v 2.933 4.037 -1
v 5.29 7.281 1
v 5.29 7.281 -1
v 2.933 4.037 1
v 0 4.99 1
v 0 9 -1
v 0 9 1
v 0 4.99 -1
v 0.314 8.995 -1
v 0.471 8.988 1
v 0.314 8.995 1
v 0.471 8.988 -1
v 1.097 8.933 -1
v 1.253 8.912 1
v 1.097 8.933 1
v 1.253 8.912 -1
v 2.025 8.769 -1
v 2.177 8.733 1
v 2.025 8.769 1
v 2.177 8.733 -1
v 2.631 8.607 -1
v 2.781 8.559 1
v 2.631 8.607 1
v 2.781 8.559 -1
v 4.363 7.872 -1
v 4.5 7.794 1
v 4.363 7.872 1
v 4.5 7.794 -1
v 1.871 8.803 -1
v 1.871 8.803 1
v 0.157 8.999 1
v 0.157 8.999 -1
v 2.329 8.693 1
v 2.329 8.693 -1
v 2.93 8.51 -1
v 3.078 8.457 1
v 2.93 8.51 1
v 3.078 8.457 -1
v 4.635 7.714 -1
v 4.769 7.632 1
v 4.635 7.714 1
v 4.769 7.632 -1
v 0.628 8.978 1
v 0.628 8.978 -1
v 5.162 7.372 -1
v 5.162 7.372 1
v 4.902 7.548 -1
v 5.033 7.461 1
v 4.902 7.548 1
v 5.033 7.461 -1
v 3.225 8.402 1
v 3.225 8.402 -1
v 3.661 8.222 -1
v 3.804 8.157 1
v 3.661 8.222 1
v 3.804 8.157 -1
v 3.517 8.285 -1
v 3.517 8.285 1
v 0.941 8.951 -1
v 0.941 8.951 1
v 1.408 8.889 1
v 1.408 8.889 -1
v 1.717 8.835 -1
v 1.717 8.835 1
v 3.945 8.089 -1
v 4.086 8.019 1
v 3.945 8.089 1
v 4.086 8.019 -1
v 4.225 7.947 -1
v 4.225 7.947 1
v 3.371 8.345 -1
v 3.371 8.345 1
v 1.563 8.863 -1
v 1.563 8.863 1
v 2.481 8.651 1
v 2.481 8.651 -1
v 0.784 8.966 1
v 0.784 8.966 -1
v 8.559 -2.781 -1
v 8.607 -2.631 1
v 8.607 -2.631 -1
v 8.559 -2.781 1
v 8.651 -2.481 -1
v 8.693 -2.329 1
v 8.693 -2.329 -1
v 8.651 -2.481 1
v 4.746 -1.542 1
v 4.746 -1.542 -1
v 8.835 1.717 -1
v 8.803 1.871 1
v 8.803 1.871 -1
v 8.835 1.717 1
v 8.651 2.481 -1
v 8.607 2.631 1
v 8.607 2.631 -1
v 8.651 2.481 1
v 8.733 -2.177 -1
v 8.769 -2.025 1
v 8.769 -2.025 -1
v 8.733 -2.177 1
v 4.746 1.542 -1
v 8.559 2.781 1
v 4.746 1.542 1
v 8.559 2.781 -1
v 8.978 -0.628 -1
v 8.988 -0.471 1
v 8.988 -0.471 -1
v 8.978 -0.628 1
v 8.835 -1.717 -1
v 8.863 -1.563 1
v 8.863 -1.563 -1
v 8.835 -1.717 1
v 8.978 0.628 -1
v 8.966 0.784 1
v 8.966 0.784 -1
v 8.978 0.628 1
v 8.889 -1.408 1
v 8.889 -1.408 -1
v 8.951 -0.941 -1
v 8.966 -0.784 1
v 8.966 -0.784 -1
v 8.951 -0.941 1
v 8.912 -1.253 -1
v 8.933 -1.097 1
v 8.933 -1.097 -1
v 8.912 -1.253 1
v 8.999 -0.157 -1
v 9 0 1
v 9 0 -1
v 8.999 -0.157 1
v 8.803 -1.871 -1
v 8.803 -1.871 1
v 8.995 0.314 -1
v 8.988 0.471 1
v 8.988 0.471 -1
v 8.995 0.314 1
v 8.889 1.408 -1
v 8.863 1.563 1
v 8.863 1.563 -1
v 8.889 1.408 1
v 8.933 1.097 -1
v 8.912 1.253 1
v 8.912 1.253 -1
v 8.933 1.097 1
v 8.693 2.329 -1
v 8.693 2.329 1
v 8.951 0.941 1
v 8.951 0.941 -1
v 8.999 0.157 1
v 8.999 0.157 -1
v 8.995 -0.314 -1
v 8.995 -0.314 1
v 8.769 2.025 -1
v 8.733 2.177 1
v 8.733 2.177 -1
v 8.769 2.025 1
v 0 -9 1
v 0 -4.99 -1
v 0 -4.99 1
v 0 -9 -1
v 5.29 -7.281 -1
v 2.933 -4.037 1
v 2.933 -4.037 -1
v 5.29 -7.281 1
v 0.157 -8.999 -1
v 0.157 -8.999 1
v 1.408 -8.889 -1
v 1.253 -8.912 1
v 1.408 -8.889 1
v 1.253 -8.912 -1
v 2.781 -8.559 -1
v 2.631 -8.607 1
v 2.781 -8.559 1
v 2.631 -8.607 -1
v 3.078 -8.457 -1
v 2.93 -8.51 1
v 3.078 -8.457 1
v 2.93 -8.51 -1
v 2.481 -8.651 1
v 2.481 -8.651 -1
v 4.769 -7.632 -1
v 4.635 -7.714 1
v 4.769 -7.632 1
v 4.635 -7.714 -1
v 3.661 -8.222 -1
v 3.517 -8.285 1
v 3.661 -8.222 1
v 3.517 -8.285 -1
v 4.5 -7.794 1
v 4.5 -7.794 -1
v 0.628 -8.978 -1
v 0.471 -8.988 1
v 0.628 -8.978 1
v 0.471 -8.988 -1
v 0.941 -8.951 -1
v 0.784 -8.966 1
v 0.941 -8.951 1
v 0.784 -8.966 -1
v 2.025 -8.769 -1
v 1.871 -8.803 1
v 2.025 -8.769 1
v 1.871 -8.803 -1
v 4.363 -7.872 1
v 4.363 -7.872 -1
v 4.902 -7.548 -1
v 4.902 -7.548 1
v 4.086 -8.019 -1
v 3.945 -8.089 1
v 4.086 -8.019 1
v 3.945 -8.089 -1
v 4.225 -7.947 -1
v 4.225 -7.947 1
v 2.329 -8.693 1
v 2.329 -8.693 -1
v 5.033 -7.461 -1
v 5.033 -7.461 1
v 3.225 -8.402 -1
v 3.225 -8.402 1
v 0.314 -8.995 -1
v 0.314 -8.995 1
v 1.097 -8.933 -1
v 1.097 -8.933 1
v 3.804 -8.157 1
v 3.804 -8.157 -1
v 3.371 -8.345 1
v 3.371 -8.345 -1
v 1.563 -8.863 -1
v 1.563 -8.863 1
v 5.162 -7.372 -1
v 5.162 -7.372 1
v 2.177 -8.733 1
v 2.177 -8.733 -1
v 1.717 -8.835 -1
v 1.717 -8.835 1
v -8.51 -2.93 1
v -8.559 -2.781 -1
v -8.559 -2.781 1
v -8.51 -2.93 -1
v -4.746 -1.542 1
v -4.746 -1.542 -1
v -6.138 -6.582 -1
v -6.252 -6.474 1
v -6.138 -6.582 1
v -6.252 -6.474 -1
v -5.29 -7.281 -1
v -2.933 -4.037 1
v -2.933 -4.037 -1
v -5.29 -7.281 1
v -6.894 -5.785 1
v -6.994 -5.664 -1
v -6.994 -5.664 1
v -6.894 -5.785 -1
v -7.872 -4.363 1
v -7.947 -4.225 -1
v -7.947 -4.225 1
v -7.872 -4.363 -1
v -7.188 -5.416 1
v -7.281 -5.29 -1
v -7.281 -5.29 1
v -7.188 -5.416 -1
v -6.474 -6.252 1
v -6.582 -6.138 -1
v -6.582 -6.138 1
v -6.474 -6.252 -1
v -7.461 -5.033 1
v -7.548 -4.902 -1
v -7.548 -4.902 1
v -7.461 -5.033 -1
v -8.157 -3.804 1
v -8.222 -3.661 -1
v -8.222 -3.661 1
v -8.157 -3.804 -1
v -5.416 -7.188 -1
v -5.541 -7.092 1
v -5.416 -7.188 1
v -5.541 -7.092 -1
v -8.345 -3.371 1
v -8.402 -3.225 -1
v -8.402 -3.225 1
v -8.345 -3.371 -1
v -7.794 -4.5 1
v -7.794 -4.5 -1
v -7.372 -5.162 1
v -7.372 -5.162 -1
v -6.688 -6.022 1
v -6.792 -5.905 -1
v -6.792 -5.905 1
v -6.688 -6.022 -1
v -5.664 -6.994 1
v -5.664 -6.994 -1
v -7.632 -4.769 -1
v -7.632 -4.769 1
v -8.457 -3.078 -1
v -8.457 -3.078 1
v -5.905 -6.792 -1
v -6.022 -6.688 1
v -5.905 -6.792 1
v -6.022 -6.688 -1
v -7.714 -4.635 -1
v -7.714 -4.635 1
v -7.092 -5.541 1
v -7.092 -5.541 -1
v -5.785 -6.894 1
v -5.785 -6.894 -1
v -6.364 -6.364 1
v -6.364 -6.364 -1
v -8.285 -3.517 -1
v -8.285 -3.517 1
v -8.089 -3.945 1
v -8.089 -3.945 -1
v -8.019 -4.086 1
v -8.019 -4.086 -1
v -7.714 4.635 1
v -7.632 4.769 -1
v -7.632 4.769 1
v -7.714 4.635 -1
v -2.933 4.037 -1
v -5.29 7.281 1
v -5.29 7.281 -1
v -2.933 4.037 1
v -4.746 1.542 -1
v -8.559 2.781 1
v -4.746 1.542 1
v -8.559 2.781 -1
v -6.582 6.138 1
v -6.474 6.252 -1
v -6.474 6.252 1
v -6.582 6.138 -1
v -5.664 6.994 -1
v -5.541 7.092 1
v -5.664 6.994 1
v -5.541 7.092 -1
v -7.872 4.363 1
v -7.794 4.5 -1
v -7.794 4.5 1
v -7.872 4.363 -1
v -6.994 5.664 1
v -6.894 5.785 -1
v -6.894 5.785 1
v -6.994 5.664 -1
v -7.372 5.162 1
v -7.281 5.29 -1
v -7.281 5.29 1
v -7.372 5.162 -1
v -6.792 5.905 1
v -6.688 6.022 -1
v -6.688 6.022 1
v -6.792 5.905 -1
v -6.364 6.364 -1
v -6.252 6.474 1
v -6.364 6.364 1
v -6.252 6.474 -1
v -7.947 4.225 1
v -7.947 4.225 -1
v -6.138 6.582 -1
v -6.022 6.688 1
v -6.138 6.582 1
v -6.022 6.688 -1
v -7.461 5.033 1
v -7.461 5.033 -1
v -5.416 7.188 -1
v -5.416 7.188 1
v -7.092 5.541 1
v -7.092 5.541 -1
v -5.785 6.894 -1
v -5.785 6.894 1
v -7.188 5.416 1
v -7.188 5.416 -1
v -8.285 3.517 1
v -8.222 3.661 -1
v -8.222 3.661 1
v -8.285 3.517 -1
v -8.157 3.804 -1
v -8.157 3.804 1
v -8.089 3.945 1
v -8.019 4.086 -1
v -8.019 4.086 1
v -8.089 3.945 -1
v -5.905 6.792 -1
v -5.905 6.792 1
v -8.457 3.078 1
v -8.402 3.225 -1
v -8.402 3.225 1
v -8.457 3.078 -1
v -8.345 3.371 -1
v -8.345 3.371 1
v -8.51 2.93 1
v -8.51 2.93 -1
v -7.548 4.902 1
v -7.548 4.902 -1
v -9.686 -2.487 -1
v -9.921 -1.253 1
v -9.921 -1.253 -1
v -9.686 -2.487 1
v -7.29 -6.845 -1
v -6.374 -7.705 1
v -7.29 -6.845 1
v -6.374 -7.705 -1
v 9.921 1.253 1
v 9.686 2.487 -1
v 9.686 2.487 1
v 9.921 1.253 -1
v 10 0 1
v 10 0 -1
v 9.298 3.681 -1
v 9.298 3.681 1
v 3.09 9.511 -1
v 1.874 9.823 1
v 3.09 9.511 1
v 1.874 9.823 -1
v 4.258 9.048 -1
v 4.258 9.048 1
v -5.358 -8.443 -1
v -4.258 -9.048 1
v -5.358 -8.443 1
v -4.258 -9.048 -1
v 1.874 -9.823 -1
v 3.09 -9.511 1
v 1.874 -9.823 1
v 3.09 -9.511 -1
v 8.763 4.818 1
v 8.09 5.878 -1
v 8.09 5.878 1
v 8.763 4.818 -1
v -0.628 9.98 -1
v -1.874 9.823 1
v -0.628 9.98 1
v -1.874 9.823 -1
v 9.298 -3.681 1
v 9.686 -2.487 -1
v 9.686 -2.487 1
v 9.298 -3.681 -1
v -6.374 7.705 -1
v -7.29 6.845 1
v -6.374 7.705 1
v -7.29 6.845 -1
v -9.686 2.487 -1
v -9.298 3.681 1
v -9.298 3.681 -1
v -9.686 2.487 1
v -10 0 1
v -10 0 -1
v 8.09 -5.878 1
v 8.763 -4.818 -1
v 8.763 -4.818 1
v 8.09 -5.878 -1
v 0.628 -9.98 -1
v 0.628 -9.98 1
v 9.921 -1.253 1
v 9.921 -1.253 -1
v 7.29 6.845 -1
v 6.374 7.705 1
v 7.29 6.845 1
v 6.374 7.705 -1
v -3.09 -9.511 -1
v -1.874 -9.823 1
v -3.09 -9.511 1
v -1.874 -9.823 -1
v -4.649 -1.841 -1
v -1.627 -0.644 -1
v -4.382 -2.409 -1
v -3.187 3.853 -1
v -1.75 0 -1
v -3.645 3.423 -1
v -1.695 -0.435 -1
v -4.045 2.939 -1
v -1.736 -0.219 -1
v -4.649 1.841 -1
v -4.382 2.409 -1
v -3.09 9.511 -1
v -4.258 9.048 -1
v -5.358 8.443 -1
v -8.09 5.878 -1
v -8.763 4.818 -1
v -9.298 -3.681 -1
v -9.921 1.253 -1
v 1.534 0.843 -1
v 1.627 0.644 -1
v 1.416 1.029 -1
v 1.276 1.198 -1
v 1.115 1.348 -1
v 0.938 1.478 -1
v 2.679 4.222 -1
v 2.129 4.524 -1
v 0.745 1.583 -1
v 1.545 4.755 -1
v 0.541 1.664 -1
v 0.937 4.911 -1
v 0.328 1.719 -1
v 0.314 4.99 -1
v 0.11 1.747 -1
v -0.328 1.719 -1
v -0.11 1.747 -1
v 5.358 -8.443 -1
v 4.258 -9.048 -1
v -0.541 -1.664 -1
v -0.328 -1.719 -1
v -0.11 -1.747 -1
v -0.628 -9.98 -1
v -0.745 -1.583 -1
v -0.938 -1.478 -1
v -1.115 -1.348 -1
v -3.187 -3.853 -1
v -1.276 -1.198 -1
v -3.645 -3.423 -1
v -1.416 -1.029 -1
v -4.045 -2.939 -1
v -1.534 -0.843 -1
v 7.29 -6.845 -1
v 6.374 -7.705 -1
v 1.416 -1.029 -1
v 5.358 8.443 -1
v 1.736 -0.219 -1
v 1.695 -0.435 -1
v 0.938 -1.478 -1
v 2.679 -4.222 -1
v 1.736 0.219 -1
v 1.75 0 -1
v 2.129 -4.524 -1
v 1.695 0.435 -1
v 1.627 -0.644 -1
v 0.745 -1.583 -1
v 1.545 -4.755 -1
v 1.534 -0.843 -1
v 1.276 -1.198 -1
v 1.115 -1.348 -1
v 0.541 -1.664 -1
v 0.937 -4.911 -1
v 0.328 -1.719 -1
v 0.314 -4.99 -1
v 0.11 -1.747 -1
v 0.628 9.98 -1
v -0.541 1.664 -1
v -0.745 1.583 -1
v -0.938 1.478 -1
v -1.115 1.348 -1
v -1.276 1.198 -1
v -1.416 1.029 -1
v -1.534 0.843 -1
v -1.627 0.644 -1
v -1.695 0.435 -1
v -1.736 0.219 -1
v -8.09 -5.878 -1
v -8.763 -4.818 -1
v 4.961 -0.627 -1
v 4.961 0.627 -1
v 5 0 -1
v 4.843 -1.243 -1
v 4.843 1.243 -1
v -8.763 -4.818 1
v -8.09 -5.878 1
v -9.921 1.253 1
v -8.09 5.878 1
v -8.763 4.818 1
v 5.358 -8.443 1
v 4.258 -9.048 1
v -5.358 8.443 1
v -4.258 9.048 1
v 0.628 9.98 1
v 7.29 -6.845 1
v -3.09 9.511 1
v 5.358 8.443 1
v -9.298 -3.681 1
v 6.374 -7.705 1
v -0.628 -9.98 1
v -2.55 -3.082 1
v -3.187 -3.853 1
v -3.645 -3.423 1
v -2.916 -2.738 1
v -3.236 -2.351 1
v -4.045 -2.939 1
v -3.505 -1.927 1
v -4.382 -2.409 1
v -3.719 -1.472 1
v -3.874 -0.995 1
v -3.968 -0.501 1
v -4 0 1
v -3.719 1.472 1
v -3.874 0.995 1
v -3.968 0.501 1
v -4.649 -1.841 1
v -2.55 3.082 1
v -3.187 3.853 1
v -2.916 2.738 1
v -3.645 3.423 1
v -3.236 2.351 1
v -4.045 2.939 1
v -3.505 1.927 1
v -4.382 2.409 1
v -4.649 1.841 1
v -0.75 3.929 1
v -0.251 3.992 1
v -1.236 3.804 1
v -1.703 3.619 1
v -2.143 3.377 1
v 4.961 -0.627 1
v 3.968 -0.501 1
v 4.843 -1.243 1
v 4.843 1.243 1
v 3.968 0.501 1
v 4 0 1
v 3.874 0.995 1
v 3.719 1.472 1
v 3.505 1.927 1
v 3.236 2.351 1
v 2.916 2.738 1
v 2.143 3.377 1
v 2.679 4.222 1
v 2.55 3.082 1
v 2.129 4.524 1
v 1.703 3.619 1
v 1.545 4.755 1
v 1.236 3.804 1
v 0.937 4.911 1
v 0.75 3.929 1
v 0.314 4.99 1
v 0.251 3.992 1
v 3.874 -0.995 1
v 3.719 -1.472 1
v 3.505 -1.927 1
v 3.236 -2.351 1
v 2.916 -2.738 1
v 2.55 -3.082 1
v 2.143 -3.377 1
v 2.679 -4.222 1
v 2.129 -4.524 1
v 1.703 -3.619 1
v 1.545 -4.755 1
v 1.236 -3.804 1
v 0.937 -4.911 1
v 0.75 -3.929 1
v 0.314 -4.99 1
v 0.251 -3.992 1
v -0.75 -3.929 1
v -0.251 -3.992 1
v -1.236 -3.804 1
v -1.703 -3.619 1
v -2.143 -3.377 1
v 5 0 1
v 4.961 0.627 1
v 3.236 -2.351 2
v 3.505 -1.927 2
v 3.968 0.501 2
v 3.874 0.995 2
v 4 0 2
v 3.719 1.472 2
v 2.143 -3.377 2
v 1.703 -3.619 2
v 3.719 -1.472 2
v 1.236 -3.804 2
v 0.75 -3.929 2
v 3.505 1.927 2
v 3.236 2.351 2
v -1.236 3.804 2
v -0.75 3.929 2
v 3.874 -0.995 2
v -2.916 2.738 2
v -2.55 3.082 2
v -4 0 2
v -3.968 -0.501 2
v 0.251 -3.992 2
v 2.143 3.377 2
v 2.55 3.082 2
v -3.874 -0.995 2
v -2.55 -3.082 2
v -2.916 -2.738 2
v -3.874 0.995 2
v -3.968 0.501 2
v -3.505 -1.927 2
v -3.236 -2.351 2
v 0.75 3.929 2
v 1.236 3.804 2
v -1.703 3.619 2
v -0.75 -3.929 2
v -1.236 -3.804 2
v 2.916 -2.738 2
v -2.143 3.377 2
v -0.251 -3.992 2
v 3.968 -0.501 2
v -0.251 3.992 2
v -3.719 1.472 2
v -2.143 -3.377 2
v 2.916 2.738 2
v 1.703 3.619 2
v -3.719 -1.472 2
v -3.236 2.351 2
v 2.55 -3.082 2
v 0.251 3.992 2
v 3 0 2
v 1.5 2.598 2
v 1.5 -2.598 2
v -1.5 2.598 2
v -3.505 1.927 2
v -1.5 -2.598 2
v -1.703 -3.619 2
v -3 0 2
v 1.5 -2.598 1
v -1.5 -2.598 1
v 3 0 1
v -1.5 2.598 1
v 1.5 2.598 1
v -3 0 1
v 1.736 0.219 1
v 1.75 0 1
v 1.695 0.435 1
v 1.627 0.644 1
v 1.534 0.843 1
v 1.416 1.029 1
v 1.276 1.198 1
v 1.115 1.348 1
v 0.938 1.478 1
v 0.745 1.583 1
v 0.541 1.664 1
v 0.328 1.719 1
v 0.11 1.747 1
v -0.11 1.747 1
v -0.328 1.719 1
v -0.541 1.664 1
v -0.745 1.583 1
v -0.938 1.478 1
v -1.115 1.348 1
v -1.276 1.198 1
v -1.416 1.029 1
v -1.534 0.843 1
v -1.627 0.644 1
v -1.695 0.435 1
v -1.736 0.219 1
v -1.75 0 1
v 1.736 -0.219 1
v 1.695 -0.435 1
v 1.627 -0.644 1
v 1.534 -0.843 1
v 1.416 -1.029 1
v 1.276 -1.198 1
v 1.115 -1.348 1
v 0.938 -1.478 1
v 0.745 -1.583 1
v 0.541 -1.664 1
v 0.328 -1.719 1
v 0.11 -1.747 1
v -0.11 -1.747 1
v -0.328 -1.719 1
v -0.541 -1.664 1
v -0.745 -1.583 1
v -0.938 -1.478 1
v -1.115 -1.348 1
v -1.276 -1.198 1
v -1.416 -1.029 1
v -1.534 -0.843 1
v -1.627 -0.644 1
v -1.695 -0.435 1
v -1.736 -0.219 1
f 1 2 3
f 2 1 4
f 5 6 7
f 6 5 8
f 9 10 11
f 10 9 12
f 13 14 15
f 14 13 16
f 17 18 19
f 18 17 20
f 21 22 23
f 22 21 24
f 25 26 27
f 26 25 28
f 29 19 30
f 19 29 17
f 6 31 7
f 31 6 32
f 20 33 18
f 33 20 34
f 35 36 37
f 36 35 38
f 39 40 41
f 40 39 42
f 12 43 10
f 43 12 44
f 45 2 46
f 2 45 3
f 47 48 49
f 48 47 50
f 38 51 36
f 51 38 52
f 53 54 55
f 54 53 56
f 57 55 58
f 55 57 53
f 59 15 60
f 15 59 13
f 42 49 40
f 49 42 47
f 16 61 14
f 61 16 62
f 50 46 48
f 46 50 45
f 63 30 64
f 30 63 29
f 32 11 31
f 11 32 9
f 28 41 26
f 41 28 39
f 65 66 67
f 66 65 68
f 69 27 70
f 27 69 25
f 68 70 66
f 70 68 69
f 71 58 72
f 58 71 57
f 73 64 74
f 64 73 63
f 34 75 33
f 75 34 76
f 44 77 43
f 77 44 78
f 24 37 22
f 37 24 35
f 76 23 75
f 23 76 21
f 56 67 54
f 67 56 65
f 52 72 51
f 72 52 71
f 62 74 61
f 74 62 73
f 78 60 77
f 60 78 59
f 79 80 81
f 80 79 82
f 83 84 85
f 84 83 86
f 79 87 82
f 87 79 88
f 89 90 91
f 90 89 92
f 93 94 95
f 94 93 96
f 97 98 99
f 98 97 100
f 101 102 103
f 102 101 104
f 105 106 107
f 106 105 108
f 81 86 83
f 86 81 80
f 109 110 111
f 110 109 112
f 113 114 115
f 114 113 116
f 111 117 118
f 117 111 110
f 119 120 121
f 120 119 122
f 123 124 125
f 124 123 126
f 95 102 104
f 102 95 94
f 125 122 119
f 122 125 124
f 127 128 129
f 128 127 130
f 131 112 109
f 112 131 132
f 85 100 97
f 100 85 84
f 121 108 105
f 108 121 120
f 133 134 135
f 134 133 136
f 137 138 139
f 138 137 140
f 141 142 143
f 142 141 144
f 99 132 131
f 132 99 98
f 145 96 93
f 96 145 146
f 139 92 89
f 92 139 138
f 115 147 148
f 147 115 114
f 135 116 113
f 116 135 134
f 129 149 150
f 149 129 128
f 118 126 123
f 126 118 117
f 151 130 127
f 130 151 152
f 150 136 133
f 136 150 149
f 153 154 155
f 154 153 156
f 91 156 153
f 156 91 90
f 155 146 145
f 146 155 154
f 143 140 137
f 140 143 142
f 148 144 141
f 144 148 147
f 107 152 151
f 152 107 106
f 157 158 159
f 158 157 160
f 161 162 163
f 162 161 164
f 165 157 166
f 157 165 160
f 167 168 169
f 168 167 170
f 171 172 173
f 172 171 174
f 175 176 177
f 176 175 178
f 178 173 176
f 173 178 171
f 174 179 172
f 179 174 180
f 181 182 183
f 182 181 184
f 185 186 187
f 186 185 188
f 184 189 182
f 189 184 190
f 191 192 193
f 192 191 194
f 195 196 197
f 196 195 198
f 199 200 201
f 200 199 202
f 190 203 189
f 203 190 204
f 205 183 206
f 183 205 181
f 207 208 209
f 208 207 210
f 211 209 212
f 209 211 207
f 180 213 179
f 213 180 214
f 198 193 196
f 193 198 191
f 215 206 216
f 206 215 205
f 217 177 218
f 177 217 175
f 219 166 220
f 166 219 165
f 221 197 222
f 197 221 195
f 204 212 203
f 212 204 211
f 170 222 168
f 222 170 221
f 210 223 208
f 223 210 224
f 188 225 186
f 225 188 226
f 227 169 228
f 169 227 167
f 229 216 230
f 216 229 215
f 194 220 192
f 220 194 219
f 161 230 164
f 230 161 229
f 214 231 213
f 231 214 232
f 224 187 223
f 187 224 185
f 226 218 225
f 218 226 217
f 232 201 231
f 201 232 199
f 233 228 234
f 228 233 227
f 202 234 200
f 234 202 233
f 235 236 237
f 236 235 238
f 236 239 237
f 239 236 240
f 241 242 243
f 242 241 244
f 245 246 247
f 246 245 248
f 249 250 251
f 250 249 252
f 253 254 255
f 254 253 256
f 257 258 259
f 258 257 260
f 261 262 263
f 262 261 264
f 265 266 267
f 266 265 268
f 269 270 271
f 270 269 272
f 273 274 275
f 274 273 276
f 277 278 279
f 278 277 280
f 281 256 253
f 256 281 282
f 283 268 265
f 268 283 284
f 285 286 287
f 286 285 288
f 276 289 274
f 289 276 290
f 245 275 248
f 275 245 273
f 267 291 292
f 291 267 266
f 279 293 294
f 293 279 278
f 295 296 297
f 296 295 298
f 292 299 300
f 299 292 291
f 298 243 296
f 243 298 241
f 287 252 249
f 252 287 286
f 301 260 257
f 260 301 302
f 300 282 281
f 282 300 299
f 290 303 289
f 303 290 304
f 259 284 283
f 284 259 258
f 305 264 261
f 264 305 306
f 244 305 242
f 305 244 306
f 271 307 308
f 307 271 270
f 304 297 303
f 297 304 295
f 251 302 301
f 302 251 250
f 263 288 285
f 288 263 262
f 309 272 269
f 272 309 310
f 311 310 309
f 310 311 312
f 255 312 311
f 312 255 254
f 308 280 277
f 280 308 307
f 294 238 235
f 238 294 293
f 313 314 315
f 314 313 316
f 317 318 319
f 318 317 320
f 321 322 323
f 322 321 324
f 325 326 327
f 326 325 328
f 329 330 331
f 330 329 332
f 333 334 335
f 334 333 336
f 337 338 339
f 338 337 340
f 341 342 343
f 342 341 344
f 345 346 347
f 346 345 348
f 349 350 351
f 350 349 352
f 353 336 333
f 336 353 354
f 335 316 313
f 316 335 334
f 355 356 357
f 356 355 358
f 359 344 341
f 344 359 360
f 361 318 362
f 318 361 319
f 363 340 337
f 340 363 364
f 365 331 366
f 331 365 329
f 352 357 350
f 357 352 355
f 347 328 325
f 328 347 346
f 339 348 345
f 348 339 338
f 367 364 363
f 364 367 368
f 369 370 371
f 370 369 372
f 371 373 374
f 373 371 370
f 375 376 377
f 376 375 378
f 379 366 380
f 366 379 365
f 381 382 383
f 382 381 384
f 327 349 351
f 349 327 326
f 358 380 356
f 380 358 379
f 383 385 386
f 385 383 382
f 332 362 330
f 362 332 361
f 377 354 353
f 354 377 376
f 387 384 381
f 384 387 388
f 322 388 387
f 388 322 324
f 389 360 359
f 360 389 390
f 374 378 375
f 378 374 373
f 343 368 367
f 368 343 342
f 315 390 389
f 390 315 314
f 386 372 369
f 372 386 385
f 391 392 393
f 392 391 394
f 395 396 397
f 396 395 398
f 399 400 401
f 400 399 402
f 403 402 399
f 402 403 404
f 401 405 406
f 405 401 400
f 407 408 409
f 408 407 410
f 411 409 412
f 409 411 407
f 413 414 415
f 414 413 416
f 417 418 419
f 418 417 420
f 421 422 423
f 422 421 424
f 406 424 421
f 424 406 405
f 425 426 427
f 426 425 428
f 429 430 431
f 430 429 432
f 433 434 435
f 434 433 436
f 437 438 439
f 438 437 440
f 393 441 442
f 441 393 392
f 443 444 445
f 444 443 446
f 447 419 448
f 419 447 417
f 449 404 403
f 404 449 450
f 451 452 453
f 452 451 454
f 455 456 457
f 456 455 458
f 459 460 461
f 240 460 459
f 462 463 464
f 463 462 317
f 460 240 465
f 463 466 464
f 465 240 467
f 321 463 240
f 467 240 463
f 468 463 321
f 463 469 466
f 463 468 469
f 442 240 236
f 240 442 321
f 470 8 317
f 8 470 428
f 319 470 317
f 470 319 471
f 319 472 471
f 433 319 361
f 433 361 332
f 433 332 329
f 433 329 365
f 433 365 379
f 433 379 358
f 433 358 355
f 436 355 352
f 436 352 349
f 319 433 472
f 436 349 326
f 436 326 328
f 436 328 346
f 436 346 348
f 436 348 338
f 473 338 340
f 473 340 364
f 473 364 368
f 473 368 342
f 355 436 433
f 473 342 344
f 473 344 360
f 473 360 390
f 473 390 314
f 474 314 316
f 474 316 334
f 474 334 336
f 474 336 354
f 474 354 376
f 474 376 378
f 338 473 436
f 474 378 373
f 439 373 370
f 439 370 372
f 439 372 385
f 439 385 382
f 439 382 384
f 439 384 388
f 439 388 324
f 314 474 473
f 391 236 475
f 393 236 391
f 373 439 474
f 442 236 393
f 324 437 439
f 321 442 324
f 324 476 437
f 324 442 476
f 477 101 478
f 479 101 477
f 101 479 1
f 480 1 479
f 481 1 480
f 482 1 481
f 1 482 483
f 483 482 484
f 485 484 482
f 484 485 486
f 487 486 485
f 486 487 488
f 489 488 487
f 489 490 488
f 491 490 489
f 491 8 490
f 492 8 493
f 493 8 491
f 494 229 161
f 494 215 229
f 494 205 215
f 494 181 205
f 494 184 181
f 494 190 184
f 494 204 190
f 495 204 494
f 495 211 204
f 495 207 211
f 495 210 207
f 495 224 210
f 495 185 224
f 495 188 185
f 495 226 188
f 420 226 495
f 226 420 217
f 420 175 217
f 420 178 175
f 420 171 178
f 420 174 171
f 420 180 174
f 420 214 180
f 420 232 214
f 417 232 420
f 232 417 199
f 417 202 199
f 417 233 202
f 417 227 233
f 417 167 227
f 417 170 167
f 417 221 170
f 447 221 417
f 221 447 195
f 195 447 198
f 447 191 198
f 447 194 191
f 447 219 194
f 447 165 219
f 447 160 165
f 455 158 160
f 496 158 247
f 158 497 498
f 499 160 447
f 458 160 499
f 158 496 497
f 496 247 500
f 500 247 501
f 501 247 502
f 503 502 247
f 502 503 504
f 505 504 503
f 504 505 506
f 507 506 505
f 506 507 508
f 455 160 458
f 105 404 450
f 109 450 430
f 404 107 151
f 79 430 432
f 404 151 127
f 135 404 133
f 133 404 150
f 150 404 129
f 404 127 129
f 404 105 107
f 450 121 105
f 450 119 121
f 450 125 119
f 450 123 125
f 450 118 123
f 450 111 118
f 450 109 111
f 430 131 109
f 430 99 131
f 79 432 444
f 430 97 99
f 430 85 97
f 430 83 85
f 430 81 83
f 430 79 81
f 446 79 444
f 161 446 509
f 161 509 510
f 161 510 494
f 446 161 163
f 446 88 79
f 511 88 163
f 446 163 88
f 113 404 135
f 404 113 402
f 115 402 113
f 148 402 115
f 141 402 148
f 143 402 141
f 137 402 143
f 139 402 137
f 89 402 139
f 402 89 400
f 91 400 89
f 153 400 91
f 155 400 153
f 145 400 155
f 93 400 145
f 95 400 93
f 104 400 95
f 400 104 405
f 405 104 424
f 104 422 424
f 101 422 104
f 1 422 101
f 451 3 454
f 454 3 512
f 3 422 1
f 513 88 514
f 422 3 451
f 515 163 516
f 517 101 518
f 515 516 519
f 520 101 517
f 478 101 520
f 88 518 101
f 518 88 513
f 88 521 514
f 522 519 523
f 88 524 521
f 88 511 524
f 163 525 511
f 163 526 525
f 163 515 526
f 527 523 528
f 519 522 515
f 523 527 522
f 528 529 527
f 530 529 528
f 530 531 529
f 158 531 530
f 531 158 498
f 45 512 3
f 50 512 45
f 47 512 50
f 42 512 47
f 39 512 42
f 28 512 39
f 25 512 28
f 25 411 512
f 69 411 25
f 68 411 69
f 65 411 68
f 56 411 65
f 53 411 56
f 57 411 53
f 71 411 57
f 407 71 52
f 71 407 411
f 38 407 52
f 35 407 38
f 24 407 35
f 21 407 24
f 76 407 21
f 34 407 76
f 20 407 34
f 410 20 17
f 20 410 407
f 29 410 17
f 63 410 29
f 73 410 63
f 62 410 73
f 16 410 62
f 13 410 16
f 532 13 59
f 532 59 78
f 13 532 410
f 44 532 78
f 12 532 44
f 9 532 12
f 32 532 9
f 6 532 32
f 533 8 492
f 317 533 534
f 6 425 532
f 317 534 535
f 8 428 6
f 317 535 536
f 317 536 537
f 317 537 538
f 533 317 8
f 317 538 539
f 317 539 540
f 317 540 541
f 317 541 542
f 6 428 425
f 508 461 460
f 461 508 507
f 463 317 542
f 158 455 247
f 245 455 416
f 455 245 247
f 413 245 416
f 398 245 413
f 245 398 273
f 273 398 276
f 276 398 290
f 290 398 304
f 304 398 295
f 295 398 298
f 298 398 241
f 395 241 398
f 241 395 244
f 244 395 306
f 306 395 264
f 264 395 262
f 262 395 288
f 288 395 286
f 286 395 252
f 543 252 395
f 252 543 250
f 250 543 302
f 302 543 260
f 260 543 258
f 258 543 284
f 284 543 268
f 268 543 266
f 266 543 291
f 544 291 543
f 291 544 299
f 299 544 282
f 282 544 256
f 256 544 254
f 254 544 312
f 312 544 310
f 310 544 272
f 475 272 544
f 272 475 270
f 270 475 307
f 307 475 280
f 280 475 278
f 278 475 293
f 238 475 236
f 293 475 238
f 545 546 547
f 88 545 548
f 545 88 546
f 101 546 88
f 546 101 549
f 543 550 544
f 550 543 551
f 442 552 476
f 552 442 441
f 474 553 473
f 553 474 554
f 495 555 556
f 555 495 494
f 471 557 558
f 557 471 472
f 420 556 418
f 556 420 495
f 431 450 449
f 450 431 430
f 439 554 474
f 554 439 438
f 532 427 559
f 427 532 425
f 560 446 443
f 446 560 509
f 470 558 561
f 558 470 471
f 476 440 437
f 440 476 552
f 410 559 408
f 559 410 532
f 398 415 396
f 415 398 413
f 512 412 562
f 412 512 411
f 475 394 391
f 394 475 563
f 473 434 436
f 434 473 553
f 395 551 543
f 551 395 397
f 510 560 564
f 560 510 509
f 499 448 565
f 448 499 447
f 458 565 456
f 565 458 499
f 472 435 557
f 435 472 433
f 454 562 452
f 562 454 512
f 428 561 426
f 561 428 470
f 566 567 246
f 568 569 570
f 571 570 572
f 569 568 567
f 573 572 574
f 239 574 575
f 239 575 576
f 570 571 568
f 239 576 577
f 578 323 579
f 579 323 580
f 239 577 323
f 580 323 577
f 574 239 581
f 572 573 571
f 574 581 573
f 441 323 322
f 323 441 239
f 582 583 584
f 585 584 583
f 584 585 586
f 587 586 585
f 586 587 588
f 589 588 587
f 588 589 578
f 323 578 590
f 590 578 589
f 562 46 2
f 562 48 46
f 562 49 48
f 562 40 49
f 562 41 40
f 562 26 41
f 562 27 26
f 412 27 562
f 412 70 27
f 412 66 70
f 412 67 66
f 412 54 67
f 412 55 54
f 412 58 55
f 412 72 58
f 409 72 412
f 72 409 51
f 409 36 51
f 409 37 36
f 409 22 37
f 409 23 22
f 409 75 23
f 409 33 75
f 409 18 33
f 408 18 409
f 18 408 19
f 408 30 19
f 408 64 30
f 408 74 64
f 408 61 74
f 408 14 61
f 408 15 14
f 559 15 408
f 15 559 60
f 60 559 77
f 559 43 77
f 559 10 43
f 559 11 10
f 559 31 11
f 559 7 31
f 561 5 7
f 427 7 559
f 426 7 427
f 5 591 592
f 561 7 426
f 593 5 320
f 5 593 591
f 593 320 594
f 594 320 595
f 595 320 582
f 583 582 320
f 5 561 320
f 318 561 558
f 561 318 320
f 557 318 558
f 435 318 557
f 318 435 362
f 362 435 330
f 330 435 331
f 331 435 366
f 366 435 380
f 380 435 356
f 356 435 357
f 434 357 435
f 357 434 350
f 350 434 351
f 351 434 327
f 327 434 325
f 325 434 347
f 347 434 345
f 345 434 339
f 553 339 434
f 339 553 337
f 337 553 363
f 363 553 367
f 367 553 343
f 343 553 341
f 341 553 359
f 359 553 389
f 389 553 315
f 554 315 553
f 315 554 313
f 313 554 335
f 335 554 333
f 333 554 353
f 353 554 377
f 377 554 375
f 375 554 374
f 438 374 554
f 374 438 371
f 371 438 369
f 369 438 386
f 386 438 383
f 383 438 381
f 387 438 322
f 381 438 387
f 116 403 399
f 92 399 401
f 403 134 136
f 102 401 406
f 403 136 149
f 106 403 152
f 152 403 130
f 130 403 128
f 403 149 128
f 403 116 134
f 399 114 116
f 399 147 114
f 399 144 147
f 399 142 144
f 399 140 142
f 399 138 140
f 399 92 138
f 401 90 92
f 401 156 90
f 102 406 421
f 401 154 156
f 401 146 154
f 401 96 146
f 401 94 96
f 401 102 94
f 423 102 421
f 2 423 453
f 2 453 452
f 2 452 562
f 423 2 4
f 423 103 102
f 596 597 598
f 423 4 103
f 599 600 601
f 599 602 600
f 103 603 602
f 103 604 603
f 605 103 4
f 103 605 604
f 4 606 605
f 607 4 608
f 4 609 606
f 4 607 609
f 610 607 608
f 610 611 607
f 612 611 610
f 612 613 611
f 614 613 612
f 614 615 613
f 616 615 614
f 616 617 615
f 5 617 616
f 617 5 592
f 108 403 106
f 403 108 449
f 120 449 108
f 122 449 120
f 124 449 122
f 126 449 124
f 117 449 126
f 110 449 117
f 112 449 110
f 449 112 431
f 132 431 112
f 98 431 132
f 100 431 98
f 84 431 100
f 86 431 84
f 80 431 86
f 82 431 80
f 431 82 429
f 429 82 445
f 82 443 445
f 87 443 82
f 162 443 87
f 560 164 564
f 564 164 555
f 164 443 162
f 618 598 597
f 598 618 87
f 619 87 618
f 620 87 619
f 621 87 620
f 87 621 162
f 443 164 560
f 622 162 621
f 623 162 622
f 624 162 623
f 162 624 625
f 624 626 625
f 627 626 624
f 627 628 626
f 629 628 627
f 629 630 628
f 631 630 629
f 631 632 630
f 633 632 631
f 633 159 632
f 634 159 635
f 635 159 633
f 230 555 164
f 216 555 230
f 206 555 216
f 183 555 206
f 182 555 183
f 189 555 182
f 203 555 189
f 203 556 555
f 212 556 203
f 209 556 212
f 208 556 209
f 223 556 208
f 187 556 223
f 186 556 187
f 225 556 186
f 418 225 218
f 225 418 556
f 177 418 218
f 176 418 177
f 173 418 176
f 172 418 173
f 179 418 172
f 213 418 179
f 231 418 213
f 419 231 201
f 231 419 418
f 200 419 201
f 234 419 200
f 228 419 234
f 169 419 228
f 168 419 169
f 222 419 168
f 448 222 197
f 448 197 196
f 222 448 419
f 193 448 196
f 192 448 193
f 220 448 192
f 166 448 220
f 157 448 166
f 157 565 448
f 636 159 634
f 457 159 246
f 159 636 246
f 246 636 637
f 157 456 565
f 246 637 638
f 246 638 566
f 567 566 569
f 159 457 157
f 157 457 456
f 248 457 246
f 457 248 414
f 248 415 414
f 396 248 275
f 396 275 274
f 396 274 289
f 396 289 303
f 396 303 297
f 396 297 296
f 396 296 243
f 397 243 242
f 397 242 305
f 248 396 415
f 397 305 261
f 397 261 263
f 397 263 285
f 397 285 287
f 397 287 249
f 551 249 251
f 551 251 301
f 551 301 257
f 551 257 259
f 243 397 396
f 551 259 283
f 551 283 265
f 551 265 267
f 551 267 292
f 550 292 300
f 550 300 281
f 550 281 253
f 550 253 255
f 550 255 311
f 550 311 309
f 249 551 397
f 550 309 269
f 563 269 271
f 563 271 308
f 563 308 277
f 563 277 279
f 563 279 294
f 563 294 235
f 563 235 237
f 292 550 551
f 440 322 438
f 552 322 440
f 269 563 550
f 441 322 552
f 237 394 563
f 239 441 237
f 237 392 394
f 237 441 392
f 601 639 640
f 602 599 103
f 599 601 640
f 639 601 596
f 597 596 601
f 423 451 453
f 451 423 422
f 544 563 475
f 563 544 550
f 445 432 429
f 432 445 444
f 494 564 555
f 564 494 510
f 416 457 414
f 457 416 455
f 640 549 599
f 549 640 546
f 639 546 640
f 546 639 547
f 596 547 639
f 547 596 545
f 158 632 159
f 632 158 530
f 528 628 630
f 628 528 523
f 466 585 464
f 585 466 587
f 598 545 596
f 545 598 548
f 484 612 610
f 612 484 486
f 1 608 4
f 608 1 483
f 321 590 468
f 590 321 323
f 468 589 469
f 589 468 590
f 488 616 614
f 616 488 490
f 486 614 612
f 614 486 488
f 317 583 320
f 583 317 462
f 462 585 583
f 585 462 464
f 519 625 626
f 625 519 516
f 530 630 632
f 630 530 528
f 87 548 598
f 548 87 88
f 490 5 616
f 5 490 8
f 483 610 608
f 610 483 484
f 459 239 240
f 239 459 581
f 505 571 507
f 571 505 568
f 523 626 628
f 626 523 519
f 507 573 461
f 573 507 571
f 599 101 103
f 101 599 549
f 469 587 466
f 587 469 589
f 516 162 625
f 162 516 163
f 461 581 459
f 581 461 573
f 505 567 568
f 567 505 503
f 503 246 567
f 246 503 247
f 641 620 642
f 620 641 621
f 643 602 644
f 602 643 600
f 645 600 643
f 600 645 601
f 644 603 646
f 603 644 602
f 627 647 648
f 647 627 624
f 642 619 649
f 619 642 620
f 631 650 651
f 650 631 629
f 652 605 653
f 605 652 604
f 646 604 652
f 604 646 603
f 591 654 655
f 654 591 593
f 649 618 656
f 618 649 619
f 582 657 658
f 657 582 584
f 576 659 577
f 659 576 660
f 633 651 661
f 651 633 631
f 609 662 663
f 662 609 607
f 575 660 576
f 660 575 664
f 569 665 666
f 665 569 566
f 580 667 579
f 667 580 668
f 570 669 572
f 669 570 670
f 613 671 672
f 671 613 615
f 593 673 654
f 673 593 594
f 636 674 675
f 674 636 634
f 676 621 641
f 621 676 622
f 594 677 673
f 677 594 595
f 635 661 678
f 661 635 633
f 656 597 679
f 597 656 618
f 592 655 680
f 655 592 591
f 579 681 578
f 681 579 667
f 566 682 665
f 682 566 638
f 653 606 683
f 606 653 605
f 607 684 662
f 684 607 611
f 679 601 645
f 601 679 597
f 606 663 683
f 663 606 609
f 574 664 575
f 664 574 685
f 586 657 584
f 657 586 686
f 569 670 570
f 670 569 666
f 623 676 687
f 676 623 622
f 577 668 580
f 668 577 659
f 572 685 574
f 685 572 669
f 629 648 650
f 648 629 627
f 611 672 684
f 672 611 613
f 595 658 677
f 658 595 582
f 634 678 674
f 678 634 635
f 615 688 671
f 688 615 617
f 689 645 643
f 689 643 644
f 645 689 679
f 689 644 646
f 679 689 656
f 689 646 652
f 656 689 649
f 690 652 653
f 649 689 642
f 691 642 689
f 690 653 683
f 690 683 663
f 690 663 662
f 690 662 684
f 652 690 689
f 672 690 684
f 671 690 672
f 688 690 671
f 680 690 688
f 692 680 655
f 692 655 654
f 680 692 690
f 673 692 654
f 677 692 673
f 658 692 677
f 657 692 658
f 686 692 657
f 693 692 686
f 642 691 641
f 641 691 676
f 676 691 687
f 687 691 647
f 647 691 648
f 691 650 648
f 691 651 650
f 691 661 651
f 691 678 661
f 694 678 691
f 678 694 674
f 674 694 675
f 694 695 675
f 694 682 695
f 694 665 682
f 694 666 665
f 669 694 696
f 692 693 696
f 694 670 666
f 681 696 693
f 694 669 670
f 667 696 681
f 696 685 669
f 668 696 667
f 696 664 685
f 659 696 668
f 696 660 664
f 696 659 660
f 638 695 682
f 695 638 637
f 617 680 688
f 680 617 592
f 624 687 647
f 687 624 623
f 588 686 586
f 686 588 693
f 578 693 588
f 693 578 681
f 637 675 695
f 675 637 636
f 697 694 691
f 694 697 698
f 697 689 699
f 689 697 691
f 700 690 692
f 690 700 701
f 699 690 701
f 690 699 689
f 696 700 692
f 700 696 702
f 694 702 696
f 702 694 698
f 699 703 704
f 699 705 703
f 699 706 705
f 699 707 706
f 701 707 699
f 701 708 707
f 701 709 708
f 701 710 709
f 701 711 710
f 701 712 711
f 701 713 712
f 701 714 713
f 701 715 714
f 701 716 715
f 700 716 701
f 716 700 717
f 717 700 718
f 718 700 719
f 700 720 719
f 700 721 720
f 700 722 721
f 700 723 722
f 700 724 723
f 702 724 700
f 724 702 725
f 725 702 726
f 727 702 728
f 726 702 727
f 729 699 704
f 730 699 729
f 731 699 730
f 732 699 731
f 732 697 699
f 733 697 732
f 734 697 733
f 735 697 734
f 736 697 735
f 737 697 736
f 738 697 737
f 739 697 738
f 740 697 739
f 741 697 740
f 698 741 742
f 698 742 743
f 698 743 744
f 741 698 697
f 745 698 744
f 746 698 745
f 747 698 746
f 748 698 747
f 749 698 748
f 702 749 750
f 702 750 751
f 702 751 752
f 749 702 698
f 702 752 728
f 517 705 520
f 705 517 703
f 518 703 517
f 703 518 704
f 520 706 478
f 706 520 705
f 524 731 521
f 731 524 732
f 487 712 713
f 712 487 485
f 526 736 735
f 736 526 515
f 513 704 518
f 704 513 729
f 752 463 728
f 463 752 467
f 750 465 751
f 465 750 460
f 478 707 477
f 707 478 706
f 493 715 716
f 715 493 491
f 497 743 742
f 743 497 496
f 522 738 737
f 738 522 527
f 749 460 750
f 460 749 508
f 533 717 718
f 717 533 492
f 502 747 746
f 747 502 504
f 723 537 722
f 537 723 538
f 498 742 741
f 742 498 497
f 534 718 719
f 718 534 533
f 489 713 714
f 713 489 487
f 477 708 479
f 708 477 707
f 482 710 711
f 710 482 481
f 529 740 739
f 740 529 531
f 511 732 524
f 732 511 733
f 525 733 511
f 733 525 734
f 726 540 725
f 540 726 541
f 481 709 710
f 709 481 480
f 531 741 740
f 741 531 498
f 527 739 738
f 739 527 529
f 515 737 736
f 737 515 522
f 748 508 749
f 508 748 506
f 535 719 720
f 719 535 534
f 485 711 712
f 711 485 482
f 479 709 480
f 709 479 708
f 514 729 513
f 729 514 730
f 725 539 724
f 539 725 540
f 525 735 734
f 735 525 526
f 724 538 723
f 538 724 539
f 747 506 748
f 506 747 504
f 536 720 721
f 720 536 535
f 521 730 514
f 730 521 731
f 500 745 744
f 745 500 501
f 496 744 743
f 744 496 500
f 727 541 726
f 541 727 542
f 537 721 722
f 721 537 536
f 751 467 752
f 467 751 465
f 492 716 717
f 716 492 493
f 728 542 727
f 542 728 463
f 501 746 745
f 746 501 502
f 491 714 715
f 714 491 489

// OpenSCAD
/* 
 * Parametric Encoder Wheel 
 *
 * by Rafael Estevam, November 2015
 * http://www.RafaelEstevam.Net
 * 
 * Licenced under Creative Commons Public Domain
*/

ExternalRadius = 10;
WallTickness = 1;
InnerRadius = 5;
TeethCount = 5;
WheelHeight = 2;
CenterHoleRadius = 1.75;
CenterHoleExagonal = "No"; // [No,Yes]
CenterSupportRadius = 4;
CenterSupportHeight = 2;
CenterSupportHoleRadius = 3;
CenterSupportHoleExagonal = "Yes"; // [No,Yes]

/* [HIDDEN] */
$fn=50;

difference(){
    union(){
        Wheel(ExternalRadius,WallTickness,
              InnerRadius,TeethCount,WheelHeight);
        cylinder(h=CenterSupportHeight,
                 r=CenterSupportRadius);
    }
    translate([0,0,WheelHeight/2])
        cylinder(h=(WheelHeight+CenterSupportHeight)*2,
                 r=CenterSupportHoleRadius,
                 $fn=CenterSupportHoleExagonal == "No" ? 50:6);
    translate([0,0,-WheelHeight+0.01])
        cylinder(h=WheelHeight*2,
                 r=CenterHoleRadius,
                 $fn=CenterHoleExagonal == "No" ? 50:6);
}


module Wheel(ExtRadius,Wall,InnerRadius,TeehCount,Height){
    cylinder(r=InnerRadius,h=Height,center=true);
    difference(){
        cylinder(r=ExtRadius,h=Height,center=true);
        for(a = [0:2:TeehCount*2]){
            stepAngle = 360.0 / (TeehCount*2);
            3DArc(Height+1,a*stepAngle,
                  (a+1)*stepAngle,
                  ExtRadius-Wall);
            
        }
    }
}
module 3DArc(Height,StartAngle,EndAngle,Radius){
    linear_extrude(height=Height,center=true)
    2DArc(StartAngle,EndAngle,Radius);
}
module 2DArc(StartAngle,EndAngle,Radius){
    points = [ 
        for (a = [StartAngle : EndAngle]) 
            Radius * [ sin(a), cos(a) ] ];
    polygon(concat(points, [[0, 0]]));
}
